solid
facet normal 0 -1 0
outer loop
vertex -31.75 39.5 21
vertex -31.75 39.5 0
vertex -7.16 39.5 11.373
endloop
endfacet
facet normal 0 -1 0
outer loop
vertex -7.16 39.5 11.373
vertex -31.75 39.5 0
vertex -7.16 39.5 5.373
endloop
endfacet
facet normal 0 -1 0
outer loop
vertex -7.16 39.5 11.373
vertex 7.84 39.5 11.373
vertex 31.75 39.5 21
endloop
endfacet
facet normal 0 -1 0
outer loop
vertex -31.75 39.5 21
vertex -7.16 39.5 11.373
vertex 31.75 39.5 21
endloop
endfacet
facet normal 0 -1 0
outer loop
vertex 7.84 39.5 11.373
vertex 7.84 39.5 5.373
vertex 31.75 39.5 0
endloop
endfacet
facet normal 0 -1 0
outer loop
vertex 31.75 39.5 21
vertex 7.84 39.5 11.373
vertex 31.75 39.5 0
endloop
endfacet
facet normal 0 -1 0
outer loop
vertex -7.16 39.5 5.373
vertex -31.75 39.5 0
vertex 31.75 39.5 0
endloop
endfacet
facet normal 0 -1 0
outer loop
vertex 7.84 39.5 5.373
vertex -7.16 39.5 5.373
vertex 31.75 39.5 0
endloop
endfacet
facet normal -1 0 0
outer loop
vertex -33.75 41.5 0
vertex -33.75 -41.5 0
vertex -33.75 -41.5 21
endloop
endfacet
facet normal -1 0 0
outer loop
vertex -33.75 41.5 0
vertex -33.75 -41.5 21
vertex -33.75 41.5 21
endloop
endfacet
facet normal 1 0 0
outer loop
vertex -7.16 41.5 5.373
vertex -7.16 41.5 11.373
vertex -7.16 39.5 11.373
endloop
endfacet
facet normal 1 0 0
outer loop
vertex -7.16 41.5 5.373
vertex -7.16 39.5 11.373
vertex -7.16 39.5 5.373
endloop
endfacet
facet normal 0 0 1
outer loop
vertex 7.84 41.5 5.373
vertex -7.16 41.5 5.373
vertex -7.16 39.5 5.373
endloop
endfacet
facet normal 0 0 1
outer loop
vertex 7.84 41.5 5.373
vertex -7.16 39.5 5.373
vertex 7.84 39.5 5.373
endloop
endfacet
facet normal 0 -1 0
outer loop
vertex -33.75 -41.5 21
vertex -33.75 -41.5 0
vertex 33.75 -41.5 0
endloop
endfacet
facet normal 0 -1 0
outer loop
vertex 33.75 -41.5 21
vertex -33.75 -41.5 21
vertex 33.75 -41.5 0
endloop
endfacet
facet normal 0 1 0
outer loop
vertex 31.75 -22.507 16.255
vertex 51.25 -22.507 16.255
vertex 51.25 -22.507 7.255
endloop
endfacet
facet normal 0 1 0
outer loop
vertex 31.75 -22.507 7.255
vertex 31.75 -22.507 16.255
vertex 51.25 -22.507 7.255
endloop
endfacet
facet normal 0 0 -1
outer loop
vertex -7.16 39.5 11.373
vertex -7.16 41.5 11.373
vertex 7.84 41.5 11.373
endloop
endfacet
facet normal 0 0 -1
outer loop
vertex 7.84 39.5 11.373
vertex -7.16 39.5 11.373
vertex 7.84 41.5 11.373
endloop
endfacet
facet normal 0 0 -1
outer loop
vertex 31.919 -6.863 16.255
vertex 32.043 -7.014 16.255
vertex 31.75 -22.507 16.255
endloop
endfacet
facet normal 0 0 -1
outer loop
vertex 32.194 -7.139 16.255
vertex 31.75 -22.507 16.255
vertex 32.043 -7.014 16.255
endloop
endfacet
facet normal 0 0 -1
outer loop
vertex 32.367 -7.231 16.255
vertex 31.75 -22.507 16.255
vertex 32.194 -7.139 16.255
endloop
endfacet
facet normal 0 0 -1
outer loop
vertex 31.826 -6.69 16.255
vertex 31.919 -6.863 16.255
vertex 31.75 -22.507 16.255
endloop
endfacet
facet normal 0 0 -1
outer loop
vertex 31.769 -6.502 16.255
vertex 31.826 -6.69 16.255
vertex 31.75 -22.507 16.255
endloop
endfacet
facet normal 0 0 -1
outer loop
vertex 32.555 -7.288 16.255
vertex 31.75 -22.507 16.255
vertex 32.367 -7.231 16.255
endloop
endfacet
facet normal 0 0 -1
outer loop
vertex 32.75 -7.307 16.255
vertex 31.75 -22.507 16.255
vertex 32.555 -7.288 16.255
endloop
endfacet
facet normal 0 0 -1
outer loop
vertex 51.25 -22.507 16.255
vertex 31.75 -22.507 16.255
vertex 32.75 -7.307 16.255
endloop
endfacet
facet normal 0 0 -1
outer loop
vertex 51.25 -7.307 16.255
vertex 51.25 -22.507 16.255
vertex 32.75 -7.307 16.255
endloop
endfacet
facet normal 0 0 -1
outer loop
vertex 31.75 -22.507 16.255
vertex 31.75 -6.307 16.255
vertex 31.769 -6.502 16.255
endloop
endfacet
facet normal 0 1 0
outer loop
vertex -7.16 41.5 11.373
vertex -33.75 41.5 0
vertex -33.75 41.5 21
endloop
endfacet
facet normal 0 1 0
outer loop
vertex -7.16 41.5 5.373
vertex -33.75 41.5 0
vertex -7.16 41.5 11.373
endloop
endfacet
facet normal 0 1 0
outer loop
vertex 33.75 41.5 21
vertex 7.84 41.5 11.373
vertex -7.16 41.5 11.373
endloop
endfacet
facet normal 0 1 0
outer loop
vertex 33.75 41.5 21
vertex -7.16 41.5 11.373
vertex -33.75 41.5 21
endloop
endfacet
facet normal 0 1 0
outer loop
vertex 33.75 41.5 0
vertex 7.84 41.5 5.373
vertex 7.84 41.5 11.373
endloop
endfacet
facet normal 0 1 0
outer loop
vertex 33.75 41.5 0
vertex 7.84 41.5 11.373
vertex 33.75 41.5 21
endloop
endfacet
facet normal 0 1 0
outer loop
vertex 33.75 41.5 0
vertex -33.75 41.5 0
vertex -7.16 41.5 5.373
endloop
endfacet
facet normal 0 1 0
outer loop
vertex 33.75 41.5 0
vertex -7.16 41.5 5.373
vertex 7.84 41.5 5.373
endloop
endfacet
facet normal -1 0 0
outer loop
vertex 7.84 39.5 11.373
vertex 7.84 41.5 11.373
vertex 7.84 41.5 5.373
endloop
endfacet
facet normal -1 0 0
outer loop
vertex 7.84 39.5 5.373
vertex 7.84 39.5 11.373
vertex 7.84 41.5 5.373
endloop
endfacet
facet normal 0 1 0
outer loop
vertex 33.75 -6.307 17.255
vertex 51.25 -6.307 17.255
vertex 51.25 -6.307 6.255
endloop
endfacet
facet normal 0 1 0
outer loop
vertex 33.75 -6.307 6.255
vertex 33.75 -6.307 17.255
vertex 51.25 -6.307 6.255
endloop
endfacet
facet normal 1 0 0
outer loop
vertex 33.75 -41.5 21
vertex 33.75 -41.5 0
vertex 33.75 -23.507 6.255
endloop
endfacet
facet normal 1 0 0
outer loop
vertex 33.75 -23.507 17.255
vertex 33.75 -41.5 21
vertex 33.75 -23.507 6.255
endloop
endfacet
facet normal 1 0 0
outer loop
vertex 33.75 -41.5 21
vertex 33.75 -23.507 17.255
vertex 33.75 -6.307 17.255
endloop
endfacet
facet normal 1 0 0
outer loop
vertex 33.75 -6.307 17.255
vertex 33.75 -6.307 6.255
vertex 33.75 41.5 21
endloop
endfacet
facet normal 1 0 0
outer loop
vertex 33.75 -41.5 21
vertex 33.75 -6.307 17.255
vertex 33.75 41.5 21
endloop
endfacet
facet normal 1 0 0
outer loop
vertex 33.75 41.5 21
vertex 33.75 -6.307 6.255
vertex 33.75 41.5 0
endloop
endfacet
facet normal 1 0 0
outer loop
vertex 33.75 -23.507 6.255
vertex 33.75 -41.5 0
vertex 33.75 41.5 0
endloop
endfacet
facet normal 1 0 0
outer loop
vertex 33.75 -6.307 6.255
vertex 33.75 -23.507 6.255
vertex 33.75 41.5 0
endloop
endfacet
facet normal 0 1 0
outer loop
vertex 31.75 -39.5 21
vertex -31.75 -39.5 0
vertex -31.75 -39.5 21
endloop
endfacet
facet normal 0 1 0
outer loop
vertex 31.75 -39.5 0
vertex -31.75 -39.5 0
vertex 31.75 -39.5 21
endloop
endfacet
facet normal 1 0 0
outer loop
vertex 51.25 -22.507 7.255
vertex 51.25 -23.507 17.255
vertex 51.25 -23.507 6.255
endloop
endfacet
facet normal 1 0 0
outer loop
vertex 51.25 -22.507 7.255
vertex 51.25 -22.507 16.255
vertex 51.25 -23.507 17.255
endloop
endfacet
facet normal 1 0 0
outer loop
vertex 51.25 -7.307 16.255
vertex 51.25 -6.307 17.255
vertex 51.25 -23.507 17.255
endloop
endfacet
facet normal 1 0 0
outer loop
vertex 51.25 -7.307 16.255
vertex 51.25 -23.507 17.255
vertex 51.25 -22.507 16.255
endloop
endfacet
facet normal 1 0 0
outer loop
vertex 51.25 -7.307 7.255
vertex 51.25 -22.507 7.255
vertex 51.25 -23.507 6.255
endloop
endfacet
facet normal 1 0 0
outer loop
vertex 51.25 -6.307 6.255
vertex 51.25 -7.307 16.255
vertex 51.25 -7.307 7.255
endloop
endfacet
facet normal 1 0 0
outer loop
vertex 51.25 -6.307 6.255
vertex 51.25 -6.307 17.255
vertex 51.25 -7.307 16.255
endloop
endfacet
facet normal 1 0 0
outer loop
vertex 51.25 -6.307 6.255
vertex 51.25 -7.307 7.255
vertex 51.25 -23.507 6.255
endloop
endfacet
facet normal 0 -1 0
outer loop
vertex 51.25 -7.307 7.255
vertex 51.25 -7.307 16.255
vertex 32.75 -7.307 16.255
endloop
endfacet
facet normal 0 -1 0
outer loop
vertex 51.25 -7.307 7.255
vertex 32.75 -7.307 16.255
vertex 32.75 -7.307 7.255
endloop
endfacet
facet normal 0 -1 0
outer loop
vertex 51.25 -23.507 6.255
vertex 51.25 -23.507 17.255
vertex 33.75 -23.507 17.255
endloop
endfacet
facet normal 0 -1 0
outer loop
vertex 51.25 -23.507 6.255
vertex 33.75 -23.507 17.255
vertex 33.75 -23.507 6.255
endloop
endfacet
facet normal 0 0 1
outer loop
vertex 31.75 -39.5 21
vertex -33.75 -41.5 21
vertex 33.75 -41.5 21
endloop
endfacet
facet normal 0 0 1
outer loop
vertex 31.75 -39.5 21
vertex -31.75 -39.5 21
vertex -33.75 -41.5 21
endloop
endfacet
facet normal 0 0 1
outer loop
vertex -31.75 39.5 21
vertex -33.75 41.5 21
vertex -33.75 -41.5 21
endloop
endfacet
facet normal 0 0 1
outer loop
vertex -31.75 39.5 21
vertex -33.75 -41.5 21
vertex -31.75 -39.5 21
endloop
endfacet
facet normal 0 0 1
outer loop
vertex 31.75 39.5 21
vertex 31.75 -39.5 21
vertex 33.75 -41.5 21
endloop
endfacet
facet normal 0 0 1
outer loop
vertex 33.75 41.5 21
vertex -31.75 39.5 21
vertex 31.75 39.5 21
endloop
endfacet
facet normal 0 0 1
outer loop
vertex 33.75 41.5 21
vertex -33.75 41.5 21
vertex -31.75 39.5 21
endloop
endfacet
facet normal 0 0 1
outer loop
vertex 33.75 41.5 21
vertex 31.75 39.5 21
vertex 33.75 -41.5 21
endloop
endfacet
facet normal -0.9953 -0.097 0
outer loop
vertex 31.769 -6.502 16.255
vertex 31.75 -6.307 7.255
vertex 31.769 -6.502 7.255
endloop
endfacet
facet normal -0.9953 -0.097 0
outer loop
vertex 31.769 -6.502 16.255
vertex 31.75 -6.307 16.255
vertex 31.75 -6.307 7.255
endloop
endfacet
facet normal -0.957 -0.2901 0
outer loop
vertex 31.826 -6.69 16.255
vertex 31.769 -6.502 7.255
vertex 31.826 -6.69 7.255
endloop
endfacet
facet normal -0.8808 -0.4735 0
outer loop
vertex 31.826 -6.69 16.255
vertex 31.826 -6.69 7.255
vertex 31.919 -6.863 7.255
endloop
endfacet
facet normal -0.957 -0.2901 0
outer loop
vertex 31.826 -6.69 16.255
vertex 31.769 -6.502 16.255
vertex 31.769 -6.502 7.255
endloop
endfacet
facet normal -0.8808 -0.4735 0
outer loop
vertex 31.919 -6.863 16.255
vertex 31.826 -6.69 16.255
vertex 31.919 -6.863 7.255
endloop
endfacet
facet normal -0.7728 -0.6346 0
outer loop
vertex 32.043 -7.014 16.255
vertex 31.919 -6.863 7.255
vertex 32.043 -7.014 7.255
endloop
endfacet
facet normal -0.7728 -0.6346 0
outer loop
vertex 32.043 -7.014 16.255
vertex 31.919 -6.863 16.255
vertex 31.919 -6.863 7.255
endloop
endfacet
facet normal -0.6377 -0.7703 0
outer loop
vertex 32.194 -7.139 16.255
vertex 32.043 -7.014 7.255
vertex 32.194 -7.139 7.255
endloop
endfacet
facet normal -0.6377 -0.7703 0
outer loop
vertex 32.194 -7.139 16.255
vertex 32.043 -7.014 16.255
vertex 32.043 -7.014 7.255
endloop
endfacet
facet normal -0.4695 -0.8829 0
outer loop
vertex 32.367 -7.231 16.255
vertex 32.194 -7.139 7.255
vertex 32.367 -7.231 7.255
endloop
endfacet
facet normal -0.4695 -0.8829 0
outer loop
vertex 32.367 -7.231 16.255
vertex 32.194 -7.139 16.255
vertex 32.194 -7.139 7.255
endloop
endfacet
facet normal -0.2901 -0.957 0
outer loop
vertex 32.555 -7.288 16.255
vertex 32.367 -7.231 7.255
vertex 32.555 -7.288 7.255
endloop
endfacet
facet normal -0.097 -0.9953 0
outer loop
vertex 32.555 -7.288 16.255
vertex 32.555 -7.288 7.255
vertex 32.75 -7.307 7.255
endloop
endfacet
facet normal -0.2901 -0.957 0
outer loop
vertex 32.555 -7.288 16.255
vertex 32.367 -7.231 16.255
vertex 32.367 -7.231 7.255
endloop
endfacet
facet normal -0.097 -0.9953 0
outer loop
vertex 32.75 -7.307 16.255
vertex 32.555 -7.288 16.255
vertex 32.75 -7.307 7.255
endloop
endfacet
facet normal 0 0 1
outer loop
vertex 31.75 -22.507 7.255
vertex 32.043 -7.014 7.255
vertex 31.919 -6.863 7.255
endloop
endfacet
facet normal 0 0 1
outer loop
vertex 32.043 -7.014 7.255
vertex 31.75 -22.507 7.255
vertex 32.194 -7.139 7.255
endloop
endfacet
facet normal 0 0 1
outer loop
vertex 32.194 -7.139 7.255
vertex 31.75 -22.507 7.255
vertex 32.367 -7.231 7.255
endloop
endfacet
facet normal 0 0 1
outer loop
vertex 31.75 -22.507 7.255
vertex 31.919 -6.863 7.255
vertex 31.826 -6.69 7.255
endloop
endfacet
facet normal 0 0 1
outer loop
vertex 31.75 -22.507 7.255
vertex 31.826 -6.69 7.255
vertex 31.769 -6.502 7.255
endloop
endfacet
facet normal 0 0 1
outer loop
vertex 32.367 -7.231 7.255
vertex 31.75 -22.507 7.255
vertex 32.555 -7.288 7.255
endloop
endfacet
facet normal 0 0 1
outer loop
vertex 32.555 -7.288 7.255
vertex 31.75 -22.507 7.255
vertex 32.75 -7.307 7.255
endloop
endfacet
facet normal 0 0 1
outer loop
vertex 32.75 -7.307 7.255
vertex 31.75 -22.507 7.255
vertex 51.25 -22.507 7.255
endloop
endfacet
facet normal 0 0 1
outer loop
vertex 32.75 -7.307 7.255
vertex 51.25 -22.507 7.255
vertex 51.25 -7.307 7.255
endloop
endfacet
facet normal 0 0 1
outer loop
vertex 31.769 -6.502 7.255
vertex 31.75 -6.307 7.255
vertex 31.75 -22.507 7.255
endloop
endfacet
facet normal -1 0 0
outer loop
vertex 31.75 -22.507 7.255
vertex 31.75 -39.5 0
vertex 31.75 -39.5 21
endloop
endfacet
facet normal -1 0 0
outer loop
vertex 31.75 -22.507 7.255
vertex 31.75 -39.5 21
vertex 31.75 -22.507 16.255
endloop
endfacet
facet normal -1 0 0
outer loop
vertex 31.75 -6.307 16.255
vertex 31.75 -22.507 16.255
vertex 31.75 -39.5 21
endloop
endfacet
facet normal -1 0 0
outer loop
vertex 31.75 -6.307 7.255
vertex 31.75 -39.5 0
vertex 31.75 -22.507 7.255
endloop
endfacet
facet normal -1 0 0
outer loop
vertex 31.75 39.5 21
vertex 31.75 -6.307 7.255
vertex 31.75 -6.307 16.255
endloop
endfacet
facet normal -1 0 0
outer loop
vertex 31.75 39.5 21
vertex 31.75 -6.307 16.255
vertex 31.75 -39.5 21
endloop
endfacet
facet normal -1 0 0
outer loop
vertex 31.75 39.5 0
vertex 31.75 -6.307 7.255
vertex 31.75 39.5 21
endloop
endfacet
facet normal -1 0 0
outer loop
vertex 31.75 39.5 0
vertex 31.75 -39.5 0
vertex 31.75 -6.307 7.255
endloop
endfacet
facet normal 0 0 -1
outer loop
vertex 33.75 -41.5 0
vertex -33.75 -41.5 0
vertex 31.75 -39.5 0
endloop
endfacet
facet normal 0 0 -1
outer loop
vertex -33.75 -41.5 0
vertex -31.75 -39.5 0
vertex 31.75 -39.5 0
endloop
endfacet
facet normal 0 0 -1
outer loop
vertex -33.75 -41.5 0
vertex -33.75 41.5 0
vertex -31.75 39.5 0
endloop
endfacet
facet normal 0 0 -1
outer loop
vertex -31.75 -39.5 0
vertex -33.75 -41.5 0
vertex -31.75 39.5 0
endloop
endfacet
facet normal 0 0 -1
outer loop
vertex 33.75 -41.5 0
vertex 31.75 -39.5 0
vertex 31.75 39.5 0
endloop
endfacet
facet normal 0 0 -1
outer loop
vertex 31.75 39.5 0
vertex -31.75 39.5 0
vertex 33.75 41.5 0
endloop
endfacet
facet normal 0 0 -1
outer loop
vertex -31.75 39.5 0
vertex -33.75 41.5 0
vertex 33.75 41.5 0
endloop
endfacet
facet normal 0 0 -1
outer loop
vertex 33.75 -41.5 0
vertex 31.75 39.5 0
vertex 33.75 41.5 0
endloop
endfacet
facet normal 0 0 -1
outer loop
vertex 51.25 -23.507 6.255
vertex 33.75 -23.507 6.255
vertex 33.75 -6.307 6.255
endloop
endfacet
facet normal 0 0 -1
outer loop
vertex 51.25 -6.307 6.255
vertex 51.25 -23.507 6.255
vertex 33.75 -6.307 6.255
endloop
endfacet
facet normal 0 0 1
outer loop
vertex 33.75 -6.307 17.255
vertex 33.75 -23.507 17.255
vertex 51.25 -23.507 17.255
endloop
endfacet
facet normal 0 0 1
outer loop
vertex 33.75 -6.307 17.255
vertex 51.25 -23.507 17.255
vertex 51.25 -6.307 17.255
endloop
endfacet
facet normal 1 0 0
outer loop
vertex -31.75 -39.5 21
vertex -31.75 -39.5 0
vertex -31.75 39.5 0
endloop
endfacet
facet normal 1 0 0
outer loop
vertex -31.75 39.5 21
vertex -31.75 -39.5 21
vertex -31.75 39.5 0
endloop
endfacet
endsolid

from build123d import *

# Parameters (mm, degrees)
SKETCH1_W           = 67.5
SKETCH1_H           = 83
SKETCH1_W_2         = 63.5
SKETCH1_H_2         = 79
BOSS_EXTRUDE1_DEPTH = 21
SKETCH2_W           = 11
SKETCH2_H           = 17.2
SKETCH2_W_2         = 9
SKETCH2_H_2         = 15.2
BOSS_EXTRUDE2_DEPTH = 17.5
SKETCH3_W           = 9
SKETCH3_H           = 15.2
CUT_EXTRUDE1_DEPTH  = 17
FILLET1_R           = 1
SKETCH4_W           = 15
SKETCH4_H           = 6
CUT_EXTRUDE2_DEPTH  = 12


with BuildPart() as part:
    # Sketch1 → Boss-Extrude1 (new body)
    with BuildSketch(Plane.XY):
        Rectangle(SKETCH1_W, SKETCH1_H)
        Rectangle(SKETCH1_W_2, SKETCH1_H_2, mode=Mode.SUBTRACT)
    extrude(amount=BOSS_EXTRUDE1_DEPTH)

    # Sketch2 → Boss-Extrude2 (add)
    with BuildSketch(Plane(origin=(33.75, 0, 0), x_dir=(0, 0, -1), z_dir=(1, 0, 0))):
        with Locations((-11.754556837, -14.907125753)):
            Rectangle(SKETCH2_W, SKETCH2_H)
        with Locations((-11.754556837, -14.907125753)):
            Rectangle(SKETCH2_W_2, SKETCH2_H_2, mode=Mode.SUBTRACT)
    extrude(amount=BOSS_EXTRUDE2_DEPTH)

    # Sketch3 → Cut-Extrude1 (cut)
    with BuildSketch(Plane(origin=(33.75, 0, 0), x_dir=(0, 0, -1), z_dir=(1, 0, 0))):
        with Locations((-11.754556837, -14.907125753)):
            Rectangle(SKETCH3_W, SKETCH3_H)
    extrude(amount=-CUT_EXTRUDE1_DEPTH, mode=Mode.SUBTRACT)

    # Fillet1
    fillet1_edges = [part.edges().sort_by_distance(p)[0] for p in [
        (31.75, -7.307125753, 11.754556837),
    ]]
    fillet(fillet1_edges, radius=FILLET1_R)

    # Sketch4 → Cut-Extrude2 (cut)
    with BuildSketch(Plane(origin=(0, 41.5, 0), x_dir=(1, 0, 0), z_dir=(0, 1, 0))):
        with Locations((0.339523704, -8.373101697)):
            Rectangle(SKETCH4_W, SKETCH4_H)
    extrude(amount=-CUT_EXTRUDE2_DEPTH, mode=Mode.SUBTRACT)


solid = part.part
